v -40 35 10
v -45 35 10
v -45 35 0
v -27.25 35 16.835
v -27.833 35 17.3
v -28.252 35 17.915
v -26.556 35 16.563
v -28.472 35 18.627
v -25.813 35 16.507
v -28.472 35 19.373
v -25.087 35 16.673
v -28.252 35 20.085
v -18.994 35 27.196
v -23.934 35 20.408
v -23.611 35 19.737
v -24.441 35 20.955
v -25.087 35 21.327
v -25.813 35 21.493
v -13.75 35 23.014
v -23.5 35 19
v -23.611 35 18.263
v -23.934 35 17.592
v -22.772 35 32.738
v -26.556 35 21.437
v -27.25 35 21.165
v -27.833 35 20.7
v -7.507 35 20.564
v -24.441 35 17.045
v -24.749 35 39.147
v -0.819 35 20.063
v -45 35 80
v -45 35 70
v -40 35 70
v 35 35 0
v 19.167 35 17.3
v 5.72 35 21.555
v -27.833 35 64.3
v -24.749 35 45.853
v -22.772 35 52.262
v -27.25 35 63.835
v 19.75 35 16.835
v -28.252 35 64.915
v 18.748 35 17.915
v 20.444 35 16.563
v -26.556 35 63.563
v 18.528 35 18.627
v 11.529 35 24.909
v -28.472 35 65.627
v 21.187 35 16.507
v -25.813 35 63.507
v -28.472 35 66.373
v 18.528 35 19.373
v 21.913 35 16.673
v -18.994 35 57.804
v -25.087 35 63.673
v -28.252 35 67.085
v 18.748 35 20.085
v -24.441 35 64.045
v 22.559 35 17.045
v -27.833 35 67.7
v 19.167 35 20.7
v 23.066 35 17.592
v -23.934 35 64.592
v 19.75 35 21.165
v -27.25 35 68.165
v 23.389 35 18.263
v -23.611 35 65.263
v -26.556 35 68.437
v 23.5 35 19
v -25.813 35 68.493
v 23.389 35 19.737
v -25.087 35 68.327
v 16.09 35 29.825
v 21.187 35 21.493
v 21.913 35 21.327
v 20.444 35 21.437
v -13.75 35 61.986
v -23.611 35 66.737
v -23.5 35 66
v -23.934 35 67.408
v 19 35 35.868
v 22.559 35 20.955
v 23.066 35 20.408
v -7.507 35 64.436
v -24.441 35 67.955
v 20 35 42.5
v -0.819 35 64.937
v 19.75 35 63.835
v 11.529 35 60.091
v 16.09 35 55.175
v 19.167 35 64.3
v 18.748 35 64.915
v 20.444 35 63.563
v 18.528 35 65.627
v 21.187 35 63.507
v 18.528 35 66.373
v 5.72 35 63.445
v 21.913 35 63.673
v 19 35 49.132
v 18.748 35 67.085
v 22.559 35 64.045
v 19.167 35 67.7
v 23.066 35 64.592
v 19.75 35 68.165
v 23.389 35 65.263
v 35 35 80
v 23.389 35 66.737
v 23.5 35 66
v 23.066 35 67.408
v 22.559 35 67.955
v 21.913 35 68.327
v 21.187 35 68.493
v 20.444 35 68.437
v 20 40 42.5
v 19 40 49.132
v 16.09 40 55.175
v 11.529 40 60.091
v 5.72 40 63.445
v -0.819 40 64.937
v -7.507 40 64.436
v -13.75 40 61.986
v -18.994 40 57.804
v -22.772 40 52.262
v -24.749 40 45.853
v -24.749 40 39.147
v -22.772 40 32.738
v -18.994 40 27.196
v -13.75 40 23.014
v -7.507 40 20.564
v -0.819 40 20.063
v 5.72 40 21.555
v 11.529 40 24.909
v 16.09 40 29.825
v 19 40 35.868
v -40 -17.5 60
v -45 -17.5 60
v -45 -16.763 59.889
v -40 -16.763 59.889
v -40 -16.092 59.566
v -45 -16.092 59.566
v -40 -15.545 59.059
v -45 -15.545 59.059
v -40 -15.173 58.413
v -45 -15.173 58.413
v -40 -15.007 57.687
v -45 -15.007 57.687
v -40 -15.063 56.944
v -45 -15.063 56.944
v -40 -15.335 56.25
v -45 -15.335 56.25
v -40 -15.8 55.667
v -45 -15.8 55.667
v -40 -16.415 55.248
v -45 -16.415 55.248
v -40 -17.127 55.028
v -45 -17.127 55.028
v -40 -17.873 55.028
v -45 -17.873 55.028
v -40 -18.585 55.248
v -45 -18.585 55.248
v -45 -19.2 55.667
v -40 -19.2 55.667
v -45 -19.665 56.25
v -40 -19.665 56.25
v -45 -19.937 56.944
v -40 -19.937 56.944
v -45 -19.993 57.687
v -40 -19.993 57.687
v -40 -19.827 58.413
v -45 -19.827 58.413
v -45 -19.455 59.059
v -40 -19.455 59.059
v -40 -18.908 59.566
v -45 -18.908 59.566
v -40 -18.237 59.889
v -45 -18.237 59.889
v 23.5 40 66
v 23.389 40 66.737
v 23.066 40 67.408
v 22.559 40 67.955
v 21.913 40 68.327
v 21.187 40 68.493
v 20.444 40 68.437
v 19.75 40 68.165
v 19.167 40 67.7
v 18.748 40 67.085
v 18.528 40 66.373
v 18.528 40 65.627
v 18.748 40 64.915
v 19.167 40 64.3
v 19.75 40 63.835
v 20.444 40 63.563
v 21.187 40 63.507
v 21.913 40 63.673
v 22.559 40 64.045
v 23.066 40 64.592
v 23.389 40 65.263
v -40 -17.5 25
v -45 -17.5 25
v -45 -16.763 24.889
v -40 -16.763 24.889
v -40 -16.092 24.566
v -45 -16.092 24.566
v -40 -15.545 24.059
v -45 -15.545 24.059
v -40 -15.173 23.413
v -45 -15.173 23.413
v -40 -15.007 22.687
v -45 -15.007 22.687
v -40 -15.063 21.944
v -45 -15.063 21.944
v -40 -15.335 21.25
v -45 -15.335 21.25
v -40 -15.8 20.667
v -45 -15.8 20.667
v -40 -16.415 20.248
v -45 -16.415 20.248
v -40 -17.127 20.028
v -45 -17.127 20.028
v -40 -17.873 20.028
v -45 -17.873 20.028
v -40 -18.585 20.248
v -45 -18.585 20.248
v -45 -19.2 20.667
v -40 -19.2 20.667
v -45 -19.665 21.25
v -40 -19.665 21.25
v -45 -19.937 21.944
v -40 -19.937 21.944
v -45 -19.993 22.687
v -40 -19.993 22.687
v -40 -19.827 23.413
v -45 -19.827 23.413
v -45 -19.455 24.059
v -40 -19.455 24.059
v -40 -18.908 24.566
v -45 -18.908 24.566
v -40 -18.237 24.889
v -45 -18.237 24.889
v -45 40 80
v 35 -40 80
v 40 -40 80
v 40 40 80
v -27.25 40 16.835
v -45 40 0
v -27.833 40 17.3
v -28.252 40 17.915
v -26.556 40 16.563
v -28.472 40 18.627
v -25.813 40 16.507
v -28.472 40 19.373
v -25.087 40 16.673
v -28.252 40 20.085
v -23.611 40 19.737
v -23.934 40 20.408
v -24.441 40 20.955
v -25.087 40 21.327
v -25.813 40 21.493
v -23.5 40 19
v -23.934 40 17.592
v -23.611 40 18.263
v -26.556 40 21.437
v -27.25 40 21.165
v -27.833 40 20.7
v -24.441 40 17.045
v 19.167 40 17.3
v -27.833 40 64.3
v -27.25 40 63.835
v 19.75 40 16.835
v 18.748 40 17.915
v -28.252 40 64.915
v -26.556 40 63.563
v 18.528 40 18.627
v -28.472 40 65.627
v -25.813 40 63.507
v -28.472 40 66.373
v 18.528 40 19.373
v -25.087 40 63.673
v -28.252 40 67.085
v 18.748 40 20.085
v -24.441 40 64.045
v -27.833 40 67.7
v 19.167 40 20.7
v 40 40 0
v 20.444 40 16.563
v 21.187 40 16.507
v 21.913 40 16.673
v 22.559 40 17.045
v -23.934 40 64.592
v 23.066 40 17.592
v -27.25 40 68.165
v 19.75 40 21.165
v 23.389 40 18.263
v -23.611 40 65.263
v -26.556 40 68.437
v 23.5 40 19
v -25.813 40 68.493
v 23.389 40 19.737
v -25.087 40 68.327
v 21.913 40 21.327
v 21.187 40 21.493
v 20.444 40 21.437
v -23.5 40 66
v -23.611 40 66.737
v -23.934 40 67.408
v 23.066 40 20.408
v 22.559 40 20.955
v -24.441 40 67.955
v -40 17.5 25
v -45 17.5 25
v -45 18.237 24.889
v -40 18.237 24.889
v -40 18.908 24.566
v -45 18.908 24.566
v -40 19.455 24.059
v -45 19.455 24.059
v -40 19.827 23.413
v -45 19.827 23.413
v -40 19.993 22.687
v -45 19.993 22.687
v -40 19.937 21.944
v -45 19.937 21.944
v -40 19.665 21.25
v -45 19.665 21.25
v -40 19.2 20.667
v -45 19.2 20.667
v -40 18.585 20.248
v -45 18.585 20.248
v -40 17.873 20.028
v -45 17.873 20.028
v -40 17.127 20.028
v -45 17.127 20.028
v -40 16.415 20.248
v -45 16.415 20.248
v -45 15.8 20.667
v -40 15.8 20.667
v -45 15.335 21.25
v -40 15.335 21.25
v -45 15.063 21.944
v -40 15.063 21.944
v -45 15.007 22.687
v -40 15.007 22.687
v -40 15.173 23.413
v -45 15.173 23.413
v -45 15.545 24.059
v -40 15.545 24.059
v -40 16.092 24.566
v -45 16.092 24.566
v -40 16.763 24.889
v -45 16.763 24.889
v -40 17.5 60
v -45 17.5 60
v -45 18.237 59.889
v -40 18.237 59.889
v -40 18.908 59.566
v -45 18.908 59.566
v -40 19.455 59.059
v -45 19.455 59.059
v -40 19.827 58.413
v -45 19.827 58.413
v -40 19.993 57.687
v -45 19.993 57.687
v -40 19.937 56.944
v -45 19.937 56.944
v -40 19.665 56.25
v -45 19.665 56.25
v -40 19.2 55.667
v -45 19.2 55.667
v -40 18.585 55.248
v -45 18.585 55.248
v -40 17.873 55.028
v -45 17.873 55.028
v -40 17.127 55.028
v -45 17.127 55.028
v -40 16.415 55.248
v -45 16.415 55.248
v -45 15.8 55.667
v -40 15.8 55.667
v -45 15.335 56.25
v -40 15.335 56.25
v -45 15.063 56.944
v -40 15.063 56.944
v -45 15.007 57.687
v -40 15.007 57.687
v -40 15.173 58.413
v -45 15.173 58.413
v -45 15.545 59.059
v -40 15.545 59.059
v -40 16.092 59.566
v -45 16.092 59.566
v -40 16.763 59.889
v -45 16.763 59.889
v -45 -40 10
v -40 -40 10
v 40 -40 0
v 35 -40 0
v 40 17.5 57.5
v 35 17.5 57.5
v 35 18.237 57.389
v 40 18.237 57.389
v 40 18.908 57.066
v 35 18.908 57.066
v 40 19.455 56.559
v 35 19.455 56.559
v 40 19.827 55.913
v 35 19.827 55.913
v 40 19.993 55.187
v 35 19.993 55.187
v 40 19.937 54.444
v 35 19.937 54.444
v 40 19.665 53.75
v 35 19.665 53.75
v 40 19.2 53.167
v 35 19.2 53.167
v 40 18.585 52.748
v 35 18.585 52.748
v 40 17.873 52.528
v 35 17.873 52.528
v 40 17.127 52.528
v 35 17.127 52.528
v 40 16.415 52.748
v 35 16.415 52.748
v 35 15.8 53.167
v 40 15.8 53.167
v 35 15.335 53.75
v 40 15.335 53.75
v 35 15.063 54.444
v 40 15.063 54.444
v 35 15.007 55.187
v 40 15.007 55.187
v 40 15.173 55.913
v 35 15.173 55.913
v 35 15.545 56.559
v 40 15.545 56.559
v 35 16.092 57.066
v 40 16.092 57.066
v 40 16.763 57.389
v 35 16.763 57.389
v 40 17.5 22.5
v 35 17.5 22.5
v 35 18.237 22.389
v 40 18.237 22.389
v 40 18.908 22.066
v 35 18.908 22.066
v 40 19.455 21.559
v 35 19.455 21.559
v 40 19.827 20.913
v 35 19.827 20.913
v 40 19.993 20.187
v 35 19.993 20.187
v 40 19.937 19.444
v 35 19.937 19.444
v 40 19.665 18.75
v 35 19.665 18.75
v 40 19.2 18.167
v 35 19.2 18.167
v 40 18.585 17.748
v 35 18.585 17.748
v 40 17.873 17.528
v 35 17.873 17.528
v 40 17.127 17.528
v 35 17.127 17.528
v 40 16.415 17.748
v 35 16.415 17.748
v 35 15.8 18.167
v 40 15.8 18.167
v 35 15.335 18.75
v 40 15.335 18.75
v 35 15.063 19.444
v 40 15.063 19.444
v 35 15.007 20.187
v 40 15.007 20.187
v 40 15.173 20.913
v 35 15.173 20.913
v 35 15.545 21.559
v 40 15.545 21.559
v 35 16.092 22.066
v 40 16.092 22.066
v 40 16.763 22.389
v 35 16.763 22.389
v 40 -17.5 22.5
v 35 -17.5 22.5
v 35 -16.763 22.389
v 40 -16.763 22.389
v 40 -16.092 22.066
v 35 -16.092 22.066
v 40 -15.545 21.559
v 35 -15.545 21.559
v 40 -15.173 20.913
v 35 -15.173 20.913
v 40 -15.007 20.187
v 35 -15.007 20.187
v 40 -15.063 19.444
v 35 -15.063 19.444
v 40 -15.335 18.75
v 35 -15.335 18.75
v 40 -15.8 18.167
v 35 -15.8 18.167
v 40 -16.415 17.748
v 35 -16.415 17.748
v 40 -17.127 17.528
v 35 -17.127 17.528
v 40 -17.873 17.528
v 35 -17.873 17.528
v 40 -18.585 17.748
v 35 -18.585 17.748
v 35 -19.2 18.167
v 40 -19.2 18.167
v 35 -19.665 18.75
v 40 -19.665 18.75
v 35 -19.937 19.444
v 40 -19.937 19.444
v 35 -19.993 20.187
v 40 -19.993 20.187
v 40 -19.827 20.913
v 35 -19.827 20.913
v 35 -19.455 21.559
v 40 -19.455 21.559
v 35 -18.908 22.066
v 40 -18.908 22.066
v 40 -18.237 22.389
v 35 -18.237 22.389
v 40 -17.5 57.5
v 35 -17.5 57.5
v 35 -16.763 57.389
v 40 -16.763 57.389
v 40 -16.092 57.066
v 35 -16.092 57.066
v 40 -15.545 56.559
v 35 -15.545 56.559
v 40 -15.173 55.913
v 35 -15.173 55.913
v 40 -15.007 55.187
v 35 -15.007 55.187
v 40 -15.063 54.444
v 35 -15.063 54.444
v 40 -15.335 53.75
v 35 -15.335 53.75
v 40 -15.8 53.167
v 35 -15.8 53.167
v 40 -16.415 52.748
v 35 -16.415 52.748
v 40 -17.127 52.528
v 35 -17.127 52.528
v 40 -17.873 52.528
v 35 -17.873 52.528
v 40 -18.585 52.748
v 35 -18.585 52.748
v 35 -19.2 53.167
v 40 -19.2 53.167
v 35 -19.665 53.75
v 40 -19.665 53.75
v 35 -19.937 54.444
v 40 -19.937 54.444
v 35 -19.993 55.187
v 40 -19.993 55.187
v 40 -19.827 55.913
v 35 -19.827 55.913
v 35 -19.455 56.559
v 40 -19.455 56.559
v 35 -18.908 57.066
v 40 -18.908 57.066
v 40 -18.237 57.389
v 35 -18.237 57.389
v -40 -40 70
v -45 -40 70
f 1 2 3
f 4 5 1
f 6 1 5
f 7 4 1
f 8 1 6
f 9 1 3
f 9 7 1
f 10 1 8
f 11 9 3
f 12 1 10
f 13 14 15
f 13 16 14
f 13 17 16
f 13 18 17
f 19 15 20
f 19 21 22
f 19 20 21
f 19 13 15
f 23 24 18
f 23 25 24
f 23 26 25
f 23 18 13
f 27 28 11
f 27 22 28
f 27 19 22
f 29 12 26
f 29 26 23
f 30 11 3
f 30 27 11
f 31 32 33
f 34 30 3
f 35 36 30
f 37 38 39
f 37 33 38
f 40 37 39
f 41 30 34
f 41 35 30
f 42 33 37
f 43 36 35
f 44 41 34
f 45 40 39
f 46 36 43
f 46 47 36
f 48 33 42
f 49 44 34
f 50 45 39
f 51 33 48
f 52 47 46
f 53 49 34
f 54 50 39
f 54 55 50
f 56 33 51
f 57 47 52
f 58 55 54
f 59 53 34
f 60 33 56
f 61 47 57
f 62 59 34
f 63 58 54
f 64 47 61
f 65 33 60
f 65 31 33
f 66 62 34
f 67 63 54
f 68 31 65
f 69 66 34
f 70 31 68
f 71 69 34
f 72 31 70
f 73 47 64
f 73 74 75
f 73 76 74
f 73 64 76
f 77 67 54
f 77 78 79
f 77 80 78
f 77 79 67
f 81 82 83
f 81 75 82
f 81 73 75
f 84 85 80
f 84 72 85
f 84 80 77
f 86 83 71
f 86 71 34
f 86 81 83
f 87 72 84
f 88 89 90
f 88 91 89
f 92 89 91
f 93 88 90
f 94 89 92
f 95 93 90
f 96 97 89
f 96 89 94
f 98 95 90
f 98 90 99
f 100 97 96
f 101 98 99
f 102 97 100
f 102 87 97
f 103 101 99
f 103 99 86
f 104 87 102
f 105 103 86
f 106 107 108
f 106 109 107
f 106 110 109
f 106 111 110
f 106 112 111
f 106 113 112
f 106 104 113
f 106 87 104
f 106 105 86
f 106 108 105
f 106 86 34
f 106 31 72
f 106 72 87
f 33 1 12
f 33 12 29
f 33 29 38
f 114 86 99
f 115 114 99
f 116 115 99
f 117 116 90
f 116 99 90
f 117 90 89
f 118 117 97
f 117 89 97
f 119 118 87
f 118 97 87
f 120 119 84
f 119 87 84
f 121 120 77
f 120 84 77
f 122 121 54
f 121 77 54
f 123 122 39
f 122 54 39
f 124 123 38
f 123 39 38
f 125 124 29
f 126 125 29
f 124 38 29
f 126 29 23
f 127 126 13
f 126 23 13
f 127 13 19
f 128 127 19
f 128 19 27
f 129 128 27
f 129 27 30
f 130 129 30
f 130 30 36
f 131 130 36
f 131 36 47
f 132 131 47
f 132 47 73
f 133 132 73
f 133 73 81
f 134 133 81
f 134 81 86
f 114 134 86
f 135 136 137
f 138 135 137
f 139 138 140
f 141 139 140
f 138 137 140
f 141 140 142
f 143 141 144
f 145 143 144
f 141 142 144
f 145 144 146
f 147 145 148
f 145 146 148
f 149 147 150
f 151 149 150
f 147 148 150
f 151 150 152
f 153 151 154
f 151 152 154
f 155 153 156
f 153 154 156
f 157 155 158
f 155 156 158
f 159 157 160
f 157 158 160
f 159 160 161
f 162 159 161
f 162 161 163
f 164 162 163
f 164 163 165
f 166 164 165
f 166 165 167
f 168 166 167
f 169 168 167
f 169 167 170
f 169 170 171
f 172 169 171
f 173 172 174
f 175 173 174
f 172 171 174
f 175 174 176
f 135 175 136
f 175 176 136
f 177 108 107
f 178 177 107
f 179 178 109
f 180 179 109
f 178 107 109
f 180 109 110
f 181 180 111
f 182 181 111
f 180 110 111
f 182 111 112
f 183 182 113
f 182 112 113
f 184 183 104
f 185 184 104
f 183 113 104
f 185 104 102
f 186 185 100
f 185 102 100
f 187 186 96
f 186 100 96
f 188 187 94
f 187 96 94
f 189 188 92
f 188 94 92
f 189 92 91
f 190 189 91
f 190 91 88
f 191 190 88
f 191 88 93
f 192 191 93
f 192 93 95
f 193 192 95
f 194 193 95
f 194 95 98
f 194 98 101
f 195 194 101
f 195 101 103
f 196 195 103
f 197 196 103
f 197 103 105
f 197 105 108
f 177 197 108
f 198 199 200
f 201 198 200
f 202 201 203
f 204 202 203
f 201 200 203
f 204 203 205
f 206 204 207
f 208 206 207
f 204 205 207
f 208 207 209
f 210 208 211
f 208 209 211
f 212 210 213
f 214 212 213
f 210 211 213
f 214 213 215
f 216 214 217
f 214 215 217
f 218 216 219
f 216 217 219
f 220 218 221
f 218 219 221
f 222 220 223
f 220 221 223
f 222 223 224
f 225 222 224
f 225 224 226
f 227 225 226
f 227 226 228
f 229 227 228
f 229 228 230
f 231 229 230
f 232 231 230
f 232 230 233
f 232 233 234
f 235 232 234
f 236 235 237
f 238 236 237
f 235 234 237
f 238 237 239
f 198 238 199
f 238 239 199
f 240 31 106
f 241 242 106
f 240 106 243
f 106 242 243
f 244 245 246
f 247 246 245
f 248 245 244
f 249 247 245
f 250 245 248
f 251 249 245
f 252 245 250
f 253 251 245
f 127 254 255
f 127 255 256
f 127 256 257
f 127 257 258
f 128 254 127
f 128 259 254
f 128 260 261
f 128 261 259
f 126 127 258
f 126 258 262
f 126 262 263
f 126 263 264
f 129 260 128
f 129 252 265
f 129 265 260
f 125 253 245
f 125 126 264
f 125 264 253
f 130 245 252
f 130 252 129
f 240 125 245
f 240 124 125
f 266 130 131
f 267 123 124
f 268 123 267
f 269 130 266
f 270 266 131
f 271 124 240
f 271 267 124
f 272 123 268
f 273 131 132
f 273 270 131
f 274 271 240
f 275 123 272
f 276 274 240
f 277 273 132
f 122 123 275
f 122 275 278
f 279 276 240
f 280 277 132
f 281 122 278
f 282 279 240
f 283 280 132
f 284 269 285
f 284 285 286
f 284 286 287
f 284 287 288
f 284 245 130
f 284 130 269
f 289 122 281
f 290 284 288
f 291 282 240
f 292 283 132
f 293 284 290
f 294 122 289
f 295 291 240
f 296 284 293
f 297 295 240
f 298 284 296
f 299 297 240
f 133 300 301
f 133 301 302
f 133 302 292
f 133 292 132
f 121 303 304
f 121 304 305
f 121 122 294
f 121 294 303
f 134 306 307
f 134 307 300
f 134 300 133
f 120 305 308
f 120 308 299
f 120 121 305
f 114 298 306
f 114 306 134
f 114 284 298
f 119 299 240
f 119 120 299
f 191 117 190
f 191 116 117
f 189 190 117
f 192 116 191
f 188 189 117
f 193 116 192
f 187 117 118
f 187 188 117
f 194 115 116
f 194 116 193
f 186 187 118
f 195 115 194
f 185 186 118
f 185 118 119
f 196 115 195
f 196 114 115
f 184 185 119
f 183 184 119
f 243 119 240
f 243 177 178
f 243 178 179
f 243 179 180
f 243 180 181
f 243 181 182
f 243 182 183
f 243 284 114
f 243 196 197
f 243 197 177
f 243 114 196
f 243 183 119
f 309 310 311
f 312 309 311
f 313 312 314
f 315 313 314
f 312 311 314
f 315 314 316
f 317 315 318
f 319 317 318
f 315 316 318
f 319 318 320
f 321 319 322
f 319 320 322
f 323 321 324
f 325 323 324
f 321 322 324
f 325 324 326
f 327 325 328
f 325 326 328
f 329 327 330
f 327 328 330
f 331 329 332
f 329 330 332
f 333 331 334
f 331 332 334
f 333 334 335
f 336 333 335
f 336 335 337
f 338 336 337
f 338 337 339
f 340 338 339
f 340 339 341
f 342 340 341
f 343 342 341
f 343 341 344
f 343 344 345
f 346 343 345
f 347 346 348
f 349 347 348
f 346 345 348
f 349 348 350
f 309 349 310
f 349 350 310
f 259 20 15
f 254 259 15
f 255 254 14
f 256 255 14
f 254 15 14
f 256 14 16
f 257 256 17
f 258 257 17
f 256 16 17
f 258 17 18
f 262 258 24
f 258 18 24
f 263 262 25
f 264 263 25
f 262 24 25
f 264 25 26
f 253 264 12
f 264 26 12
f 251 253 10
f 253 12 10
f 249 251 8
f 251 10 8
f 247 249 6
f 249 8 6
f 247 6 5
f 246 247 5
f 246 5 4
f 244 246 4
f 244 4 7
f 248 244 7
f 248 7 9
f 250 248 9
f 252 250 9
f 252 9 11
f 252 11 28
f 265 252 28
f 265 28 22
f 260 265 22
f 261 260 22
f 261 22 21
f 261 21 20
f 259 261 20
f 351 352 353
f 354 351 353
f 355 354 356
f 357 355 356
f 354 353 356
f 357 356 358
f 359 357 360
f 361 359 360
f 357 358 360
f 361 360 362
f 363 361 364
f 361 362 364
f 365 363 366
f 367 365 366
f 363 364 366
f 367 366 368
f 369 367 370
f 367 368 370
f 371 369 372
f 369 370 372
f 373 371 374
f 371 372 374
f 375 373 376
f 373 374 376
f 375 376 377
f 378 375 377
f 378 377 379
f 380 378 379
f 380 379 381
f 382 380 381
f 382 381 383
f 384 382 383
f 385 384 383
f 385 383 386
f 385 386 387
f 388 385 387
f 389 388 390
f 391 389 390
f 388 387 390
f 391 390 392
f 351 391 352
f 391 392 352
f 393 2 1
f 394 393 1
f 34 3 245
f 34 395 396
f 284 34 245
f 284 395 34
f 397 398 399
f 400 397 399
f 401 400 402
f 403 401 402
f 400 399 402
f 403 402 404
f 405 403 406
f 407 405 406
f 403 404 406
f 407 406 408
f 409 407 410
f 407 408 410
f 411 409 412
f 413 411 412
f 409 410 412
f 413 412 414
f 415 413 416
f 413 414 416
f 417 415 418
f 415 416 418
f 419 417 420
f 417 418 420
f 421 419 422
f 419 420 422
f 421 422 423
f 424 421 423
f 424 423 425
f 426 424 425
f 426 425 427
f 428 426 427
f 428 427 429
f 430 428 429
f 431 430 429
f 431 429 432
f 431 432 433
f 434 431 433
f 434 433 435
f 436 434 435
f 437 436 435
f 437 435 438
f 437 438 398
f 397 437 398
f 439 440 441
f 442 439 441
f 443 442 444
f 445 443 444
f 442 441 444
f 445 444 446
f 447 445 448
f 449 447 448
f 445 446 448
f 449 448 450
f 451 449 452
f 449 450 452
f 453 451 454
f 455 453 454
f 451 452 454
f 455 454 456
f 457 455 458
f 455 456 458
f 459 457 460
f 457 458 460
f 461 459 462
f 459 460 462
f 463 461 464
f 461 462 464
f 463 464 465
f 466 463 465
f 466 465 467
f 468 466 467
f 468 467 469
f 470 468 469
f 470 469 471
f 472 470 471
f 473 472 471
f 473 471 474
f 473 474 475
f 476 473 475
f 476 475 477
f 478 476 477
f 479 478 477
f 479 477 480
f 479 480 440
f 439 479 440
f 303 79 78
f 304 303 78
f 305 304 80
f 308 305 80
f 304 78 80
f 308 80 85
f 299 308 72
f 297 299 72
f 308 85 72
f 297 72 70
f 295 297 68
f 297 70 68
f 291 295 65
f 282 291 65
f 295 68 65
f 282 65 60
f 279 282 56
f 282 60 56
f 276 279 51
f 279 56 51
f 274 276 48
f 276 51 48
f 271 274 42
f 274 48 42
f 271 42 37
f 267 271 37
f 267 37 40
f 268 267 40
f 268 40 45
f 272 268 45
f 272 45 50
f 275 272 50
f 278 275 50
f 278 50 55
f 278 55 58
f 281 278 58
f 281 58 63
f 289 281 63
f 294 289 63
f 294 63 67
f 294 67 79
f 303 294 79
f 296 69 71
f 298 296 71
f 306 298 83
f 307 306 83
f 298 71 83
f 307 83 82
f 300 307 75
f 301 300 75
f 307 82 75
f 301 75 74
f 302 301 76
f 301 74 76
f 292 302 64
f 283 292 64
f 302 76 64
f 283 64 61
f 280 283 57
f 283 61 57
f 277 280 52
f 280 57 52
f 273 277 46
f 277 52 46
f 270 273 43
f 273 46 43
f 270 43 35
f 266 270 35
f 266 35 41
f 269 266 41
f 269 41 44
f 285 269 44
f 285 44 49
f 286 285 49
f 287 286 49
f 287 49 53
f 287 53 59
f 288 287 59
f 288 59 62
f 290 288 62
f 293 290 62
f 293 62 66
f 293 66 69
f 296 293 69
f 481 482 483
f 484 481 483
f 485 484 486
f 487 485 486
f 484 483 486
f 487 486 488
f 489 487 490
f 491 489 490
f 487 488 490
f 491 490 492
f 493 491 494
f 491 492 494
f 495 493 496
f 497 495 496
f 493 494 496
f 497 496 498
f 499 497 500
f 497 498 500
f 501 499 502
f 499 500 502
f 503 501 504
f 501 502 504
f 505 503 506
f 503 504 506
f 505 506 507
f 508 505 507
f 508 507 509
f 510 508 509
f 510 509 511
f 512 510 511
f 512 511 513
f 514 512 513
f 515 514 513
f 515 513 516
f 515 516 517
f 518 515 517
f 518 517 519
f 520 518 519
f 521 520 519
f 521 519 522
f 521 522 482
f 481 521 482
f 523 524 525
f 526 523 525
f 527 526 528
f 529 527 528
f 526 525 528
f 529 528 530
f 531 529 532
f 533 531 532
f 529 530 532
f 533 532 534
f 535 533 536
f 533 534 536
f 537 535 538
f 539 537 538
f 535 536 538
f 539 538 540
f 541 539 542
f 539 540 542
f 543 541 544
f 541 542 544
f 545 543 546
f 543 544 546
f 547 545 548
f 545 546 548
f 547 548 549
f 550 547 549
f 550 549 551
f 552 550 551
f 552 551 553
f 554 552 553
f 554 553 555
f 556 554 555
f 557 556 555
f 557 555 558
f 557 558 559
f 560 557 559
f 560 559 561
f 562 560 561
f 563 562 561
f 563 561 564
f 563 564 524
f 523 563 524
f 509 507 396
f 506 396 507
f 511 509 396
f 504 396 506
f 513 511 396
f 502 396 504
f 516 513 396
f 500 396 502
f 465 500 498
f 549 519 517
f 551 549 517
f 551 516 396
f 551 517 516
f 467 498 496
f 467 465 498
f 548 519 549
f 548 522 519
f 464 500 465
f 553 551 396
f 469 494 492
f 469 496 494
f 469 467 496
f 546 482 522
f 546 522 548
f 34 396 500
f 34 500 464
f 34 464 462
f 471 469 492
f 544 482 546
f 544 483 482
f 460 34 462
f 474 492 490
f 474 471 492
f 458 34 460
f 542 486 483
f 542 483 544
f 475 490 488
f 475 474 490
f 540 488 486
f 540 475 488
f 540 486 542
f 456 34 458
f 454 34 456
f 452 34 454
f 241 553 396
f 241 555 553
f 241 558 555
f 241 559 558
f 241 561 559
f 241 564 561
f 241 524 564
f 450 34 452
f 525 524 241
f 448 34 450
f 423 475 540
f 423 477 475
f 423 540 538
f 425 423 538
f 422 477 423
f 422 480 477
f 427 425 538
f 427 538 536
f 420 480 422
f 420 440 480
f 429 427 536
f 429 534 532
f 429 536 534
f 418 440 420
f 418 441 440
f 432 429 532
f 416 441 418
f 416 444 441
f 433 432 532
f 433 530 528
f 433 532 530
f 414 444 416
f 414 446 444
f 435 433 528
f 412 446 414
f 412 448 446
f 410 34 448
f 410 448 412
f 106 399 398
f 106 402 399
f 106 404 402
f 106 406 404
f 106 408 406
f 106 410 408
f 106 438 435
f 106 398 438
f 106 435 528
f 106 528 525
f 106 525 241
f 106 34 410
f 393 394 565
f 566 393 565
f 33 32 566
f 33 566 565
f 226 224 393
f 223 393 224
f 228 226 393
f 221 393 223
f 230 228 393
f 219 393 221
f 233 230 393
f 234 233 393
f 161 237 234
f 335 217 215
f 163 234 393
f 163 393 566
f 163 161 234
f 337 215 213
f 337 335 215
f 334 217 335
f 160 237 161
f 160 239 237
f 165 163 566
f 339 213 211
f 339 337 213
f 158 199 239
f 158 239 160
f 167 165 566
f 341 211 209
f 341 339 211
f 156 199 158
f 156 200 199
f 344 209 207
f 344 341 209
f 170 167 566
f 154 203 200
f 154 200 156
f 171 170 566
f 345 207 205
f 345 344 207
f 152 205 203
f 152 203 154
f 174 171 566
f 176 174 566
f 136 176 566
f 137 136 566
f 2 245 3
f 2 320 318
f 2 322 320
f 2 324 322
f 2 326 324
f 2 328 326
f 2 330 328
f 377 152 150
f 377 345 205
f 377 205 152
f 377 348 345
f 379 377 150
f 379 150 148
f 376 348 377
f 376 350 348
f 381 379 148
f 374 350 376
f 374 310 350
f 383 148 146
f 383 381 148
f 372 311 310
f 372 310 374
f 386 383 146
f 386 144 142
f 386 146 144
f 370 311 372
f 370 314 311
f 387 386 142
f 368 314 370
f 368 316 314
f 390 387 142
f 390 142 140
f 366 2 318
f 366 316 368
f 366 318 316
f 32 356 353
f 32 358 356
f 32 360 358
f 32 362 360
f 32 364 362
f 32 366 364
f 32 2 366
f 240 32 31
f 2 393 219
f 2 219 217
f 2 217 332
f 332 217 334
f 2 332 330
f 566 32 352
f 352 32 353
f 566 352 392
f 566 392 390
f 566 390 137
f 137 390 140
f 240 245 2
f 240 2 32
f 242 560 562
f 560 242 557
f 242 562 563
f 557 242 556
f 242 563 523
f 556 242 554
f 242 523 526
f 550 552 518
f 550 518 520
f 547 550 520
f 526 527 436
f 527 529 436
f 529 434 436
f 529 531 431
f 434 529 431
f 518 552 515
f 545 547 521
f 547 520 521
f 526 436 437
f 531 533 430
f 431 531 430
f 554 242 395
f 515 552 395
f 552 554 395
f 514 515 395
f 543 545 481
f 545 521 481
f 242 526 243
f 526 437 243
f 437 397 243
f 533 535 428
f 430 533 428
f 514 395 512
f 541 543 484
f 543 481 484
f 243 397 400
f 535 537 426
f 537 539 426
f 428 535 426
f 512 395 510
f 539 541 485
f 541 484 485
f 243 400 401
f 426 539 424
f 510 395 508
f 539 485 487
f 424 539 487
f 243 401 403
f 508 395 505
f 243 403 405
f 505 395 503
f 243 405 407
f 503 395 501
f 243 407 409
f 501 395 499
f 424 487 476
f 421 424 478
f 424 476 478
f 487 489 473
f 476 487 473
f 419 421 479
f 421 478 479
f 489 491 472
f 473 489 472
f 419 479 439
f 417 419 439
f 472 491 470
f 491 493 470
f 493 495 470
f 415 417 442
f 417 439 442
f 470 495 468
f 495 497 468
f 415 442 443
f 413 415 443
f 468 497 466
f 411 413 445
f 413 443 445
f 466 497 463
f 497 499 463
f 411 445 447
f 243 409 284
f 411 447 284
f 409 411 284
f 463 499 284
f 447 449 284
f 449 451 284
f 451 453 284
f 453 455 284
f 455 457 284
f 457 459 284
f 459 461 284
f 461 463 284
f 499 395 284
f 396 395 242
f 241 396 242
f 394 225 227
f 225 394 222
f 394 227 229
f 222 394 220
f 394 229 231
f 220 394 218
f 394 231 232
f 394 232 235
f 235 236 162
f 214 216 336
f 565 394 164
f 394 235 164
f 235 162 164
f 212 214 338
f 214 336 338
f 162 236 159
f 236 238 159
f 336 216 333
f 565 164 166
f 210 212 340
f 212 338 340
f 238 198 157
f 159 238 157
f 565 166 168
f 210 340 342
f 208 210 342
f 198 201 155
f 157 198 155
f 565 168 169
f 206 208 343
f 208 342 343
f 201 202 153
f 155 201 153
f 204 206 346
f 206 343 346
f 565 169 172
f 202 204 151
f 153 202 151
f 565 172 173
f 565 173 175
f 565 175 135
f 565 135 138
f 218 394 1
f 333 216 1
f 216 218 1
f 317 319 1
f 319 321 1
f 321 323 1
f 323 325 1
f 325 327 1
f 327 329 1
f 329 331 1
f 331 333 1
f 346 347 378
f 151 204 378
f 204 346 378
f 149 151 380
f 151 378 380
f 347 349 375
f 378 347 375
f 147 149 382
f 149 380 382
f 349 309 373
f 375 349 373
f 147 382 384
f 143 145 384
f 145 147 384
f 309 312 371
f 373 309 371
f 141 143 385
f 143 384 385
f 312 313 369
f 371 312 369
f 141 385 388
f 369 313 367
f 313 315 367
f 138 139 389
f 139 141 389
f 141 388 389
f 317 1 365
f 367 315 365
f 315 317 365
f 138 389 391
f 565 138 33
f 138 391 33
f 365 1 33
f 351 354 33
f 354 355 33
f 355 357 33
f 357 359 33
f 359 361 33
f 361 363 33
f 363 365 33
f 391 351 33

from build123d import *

# Parameters (mm, degrees)
SKETCH1_W           = 80
SKETCH1_H           = 80
BOSS_EXTRUDE1_DEPTH = 80
SKETCH2_W           = 75
SKETCH2_H           = 75
CUT_EXTRUDE1_DEPTH  = 75
SKETCH3_R           = 2.5
CUT_EXTRUDE2_DEPTH  = 50
SKETCH4_R           = 2.5
CUT_EXTRUDE3_DEPTH  = 50
SKETCH5_R           = 22.5
CUT_EXTRUDE4_DEPTH  = 50
SKETCH8_W           = 80
SKETCH8_H           = 80
BOSS_EXTRUDE2_DEPTH = 5
SKETCH9_R           = 2.5
CUT_EXTRUDE5_DEPTH  = 5
SKETCH10_W          = 5
SKETCH10_H          = 10
CUT_EXTRUDE6_DEPTH  = 75
SKETCH11_W          = 5
SKETCH11_H          = 75
CUT_EXTRUDE7_DEPTH  = 75


with BuildPart() as part:
    # Sketch1 → Boss-Extrude1 (new body)
    with BuildSketch(Plane.XY):
        Rectangle(SKETCH1_W, SKETCH1_H)
    extrude(amount=BOSS_EXTRUDE1_DEPTH)

    # Sketch2 → Cut-Extrude1 (cut)
    with BuildSketch(Plane.XY.offset(80)):
        with Locations((-2.5, -2.5)):
            Rectangle(SKETCH2_W, SKETCH2_H)
    extrude(amount=-CUT_EXTRUDE1_DEPTH, mode=Mode.SUBTRACT)

    # Sketch3 → Cut-Extrude2 (cut)
    with BuildSketch(Plane.ZY.offset(-35)):
        with Locations((55, -17.5)):
            Circle(SKETCH3_R)
        with Locations((20, -17.5)):
            Circle(SKETCH3_R)
        with Locations((20, 17.5)):
            Circle(SKETCH3_R)
        with Locations((55, 17.5)):
            Circle(SKETCH3_R)
    extrude(amount=-CUT_EXTRUDE2_DEPTH, mode=Mode.SUBTRACT)

    # Sketch4 → Cut-Extrude3 (cut)
    with BuildSketch(Plane.XZ.offset(-35)):
        with Locations((-26, 66)):
            Circle(SKETCH4_R)
        with Locations((21, 66)):
            Circle(SKETCH4_R)
        with Locations((-26, 19)):
            Circle(SKETCH4_R)
        with Locations((21, 19)):
            Circle(SKETCH4_R)
    extrude(amount=-CUT_EXTRUDE3_DEPTH, mode=Mode.SUBTRACT)

    # Sketch5 → Cut-Extrude4 (cut)
    with BuildSketch(Plane.XZ.offset(-35)):
        with Locations((-2.5, 42.5)):
            Circle(SKETCH5_R)
    extrude(amount=-CUT_EXTRUDE4_DEPTH, mode=Mode.SUBTRACT)

    # Sketch8 → Boss-Extrude2 (add)
    with BuildSketch(Plane.ZY.offset(40)):
        with Locations((40, 0)):
            Rectangle(SKETCH8_W, SKETCH8_H)
    extrude(amount=BOSS_EXTRUDE2_DEPTH)

    # Sketch9 → Cut-Extrude5 (cut)
    with BuildSketch(Plane.ZY.offset(45)):
        with Locations((22.5, 17.5)):
            Circle(SKETCH9_R)
        with Locations((57.5, 17.5)):
            Circle(SKETCH9_R)
        with Locations((22.5, -17.5)):
            Circle(SKETCH9_R)
        with Locations((57.5, -17.5)):
            Circle(SKETCH9_R)
    extrude(amount=-CUT_EXTRUDE5_DEPTH, mode=Mode.SUBTRACT)

    # Sketch10 → Cut-Extrude6 (cut)
    with BuildSketch(Plane.XZ.offset(40)):
        with Locations((-42.5, 75)):
            Rectangle(SKETCH10_W, SKETCH10_H)
        with Locations((-42.5, 5)):
            Rectangle(SKETCH10_W, SKETCH10_H)
    extrude(amount=-CUT_EXTRUDE6_DEPTH, mode=Mode.SUBTRACT)

    # Sketch11 → Cut-Extrude7 (cut)
    with BuildSketch(Plane.ZY.offset(40)):
        with Locations((2.5, -2.5)):
            Rectangle(SKETCH11_W, SKETCH11_H)
    extrude(amount=-CUT_EXTRUDE7_DEPTH, mode=Mode.SUBTRACT)


solid = part.part
